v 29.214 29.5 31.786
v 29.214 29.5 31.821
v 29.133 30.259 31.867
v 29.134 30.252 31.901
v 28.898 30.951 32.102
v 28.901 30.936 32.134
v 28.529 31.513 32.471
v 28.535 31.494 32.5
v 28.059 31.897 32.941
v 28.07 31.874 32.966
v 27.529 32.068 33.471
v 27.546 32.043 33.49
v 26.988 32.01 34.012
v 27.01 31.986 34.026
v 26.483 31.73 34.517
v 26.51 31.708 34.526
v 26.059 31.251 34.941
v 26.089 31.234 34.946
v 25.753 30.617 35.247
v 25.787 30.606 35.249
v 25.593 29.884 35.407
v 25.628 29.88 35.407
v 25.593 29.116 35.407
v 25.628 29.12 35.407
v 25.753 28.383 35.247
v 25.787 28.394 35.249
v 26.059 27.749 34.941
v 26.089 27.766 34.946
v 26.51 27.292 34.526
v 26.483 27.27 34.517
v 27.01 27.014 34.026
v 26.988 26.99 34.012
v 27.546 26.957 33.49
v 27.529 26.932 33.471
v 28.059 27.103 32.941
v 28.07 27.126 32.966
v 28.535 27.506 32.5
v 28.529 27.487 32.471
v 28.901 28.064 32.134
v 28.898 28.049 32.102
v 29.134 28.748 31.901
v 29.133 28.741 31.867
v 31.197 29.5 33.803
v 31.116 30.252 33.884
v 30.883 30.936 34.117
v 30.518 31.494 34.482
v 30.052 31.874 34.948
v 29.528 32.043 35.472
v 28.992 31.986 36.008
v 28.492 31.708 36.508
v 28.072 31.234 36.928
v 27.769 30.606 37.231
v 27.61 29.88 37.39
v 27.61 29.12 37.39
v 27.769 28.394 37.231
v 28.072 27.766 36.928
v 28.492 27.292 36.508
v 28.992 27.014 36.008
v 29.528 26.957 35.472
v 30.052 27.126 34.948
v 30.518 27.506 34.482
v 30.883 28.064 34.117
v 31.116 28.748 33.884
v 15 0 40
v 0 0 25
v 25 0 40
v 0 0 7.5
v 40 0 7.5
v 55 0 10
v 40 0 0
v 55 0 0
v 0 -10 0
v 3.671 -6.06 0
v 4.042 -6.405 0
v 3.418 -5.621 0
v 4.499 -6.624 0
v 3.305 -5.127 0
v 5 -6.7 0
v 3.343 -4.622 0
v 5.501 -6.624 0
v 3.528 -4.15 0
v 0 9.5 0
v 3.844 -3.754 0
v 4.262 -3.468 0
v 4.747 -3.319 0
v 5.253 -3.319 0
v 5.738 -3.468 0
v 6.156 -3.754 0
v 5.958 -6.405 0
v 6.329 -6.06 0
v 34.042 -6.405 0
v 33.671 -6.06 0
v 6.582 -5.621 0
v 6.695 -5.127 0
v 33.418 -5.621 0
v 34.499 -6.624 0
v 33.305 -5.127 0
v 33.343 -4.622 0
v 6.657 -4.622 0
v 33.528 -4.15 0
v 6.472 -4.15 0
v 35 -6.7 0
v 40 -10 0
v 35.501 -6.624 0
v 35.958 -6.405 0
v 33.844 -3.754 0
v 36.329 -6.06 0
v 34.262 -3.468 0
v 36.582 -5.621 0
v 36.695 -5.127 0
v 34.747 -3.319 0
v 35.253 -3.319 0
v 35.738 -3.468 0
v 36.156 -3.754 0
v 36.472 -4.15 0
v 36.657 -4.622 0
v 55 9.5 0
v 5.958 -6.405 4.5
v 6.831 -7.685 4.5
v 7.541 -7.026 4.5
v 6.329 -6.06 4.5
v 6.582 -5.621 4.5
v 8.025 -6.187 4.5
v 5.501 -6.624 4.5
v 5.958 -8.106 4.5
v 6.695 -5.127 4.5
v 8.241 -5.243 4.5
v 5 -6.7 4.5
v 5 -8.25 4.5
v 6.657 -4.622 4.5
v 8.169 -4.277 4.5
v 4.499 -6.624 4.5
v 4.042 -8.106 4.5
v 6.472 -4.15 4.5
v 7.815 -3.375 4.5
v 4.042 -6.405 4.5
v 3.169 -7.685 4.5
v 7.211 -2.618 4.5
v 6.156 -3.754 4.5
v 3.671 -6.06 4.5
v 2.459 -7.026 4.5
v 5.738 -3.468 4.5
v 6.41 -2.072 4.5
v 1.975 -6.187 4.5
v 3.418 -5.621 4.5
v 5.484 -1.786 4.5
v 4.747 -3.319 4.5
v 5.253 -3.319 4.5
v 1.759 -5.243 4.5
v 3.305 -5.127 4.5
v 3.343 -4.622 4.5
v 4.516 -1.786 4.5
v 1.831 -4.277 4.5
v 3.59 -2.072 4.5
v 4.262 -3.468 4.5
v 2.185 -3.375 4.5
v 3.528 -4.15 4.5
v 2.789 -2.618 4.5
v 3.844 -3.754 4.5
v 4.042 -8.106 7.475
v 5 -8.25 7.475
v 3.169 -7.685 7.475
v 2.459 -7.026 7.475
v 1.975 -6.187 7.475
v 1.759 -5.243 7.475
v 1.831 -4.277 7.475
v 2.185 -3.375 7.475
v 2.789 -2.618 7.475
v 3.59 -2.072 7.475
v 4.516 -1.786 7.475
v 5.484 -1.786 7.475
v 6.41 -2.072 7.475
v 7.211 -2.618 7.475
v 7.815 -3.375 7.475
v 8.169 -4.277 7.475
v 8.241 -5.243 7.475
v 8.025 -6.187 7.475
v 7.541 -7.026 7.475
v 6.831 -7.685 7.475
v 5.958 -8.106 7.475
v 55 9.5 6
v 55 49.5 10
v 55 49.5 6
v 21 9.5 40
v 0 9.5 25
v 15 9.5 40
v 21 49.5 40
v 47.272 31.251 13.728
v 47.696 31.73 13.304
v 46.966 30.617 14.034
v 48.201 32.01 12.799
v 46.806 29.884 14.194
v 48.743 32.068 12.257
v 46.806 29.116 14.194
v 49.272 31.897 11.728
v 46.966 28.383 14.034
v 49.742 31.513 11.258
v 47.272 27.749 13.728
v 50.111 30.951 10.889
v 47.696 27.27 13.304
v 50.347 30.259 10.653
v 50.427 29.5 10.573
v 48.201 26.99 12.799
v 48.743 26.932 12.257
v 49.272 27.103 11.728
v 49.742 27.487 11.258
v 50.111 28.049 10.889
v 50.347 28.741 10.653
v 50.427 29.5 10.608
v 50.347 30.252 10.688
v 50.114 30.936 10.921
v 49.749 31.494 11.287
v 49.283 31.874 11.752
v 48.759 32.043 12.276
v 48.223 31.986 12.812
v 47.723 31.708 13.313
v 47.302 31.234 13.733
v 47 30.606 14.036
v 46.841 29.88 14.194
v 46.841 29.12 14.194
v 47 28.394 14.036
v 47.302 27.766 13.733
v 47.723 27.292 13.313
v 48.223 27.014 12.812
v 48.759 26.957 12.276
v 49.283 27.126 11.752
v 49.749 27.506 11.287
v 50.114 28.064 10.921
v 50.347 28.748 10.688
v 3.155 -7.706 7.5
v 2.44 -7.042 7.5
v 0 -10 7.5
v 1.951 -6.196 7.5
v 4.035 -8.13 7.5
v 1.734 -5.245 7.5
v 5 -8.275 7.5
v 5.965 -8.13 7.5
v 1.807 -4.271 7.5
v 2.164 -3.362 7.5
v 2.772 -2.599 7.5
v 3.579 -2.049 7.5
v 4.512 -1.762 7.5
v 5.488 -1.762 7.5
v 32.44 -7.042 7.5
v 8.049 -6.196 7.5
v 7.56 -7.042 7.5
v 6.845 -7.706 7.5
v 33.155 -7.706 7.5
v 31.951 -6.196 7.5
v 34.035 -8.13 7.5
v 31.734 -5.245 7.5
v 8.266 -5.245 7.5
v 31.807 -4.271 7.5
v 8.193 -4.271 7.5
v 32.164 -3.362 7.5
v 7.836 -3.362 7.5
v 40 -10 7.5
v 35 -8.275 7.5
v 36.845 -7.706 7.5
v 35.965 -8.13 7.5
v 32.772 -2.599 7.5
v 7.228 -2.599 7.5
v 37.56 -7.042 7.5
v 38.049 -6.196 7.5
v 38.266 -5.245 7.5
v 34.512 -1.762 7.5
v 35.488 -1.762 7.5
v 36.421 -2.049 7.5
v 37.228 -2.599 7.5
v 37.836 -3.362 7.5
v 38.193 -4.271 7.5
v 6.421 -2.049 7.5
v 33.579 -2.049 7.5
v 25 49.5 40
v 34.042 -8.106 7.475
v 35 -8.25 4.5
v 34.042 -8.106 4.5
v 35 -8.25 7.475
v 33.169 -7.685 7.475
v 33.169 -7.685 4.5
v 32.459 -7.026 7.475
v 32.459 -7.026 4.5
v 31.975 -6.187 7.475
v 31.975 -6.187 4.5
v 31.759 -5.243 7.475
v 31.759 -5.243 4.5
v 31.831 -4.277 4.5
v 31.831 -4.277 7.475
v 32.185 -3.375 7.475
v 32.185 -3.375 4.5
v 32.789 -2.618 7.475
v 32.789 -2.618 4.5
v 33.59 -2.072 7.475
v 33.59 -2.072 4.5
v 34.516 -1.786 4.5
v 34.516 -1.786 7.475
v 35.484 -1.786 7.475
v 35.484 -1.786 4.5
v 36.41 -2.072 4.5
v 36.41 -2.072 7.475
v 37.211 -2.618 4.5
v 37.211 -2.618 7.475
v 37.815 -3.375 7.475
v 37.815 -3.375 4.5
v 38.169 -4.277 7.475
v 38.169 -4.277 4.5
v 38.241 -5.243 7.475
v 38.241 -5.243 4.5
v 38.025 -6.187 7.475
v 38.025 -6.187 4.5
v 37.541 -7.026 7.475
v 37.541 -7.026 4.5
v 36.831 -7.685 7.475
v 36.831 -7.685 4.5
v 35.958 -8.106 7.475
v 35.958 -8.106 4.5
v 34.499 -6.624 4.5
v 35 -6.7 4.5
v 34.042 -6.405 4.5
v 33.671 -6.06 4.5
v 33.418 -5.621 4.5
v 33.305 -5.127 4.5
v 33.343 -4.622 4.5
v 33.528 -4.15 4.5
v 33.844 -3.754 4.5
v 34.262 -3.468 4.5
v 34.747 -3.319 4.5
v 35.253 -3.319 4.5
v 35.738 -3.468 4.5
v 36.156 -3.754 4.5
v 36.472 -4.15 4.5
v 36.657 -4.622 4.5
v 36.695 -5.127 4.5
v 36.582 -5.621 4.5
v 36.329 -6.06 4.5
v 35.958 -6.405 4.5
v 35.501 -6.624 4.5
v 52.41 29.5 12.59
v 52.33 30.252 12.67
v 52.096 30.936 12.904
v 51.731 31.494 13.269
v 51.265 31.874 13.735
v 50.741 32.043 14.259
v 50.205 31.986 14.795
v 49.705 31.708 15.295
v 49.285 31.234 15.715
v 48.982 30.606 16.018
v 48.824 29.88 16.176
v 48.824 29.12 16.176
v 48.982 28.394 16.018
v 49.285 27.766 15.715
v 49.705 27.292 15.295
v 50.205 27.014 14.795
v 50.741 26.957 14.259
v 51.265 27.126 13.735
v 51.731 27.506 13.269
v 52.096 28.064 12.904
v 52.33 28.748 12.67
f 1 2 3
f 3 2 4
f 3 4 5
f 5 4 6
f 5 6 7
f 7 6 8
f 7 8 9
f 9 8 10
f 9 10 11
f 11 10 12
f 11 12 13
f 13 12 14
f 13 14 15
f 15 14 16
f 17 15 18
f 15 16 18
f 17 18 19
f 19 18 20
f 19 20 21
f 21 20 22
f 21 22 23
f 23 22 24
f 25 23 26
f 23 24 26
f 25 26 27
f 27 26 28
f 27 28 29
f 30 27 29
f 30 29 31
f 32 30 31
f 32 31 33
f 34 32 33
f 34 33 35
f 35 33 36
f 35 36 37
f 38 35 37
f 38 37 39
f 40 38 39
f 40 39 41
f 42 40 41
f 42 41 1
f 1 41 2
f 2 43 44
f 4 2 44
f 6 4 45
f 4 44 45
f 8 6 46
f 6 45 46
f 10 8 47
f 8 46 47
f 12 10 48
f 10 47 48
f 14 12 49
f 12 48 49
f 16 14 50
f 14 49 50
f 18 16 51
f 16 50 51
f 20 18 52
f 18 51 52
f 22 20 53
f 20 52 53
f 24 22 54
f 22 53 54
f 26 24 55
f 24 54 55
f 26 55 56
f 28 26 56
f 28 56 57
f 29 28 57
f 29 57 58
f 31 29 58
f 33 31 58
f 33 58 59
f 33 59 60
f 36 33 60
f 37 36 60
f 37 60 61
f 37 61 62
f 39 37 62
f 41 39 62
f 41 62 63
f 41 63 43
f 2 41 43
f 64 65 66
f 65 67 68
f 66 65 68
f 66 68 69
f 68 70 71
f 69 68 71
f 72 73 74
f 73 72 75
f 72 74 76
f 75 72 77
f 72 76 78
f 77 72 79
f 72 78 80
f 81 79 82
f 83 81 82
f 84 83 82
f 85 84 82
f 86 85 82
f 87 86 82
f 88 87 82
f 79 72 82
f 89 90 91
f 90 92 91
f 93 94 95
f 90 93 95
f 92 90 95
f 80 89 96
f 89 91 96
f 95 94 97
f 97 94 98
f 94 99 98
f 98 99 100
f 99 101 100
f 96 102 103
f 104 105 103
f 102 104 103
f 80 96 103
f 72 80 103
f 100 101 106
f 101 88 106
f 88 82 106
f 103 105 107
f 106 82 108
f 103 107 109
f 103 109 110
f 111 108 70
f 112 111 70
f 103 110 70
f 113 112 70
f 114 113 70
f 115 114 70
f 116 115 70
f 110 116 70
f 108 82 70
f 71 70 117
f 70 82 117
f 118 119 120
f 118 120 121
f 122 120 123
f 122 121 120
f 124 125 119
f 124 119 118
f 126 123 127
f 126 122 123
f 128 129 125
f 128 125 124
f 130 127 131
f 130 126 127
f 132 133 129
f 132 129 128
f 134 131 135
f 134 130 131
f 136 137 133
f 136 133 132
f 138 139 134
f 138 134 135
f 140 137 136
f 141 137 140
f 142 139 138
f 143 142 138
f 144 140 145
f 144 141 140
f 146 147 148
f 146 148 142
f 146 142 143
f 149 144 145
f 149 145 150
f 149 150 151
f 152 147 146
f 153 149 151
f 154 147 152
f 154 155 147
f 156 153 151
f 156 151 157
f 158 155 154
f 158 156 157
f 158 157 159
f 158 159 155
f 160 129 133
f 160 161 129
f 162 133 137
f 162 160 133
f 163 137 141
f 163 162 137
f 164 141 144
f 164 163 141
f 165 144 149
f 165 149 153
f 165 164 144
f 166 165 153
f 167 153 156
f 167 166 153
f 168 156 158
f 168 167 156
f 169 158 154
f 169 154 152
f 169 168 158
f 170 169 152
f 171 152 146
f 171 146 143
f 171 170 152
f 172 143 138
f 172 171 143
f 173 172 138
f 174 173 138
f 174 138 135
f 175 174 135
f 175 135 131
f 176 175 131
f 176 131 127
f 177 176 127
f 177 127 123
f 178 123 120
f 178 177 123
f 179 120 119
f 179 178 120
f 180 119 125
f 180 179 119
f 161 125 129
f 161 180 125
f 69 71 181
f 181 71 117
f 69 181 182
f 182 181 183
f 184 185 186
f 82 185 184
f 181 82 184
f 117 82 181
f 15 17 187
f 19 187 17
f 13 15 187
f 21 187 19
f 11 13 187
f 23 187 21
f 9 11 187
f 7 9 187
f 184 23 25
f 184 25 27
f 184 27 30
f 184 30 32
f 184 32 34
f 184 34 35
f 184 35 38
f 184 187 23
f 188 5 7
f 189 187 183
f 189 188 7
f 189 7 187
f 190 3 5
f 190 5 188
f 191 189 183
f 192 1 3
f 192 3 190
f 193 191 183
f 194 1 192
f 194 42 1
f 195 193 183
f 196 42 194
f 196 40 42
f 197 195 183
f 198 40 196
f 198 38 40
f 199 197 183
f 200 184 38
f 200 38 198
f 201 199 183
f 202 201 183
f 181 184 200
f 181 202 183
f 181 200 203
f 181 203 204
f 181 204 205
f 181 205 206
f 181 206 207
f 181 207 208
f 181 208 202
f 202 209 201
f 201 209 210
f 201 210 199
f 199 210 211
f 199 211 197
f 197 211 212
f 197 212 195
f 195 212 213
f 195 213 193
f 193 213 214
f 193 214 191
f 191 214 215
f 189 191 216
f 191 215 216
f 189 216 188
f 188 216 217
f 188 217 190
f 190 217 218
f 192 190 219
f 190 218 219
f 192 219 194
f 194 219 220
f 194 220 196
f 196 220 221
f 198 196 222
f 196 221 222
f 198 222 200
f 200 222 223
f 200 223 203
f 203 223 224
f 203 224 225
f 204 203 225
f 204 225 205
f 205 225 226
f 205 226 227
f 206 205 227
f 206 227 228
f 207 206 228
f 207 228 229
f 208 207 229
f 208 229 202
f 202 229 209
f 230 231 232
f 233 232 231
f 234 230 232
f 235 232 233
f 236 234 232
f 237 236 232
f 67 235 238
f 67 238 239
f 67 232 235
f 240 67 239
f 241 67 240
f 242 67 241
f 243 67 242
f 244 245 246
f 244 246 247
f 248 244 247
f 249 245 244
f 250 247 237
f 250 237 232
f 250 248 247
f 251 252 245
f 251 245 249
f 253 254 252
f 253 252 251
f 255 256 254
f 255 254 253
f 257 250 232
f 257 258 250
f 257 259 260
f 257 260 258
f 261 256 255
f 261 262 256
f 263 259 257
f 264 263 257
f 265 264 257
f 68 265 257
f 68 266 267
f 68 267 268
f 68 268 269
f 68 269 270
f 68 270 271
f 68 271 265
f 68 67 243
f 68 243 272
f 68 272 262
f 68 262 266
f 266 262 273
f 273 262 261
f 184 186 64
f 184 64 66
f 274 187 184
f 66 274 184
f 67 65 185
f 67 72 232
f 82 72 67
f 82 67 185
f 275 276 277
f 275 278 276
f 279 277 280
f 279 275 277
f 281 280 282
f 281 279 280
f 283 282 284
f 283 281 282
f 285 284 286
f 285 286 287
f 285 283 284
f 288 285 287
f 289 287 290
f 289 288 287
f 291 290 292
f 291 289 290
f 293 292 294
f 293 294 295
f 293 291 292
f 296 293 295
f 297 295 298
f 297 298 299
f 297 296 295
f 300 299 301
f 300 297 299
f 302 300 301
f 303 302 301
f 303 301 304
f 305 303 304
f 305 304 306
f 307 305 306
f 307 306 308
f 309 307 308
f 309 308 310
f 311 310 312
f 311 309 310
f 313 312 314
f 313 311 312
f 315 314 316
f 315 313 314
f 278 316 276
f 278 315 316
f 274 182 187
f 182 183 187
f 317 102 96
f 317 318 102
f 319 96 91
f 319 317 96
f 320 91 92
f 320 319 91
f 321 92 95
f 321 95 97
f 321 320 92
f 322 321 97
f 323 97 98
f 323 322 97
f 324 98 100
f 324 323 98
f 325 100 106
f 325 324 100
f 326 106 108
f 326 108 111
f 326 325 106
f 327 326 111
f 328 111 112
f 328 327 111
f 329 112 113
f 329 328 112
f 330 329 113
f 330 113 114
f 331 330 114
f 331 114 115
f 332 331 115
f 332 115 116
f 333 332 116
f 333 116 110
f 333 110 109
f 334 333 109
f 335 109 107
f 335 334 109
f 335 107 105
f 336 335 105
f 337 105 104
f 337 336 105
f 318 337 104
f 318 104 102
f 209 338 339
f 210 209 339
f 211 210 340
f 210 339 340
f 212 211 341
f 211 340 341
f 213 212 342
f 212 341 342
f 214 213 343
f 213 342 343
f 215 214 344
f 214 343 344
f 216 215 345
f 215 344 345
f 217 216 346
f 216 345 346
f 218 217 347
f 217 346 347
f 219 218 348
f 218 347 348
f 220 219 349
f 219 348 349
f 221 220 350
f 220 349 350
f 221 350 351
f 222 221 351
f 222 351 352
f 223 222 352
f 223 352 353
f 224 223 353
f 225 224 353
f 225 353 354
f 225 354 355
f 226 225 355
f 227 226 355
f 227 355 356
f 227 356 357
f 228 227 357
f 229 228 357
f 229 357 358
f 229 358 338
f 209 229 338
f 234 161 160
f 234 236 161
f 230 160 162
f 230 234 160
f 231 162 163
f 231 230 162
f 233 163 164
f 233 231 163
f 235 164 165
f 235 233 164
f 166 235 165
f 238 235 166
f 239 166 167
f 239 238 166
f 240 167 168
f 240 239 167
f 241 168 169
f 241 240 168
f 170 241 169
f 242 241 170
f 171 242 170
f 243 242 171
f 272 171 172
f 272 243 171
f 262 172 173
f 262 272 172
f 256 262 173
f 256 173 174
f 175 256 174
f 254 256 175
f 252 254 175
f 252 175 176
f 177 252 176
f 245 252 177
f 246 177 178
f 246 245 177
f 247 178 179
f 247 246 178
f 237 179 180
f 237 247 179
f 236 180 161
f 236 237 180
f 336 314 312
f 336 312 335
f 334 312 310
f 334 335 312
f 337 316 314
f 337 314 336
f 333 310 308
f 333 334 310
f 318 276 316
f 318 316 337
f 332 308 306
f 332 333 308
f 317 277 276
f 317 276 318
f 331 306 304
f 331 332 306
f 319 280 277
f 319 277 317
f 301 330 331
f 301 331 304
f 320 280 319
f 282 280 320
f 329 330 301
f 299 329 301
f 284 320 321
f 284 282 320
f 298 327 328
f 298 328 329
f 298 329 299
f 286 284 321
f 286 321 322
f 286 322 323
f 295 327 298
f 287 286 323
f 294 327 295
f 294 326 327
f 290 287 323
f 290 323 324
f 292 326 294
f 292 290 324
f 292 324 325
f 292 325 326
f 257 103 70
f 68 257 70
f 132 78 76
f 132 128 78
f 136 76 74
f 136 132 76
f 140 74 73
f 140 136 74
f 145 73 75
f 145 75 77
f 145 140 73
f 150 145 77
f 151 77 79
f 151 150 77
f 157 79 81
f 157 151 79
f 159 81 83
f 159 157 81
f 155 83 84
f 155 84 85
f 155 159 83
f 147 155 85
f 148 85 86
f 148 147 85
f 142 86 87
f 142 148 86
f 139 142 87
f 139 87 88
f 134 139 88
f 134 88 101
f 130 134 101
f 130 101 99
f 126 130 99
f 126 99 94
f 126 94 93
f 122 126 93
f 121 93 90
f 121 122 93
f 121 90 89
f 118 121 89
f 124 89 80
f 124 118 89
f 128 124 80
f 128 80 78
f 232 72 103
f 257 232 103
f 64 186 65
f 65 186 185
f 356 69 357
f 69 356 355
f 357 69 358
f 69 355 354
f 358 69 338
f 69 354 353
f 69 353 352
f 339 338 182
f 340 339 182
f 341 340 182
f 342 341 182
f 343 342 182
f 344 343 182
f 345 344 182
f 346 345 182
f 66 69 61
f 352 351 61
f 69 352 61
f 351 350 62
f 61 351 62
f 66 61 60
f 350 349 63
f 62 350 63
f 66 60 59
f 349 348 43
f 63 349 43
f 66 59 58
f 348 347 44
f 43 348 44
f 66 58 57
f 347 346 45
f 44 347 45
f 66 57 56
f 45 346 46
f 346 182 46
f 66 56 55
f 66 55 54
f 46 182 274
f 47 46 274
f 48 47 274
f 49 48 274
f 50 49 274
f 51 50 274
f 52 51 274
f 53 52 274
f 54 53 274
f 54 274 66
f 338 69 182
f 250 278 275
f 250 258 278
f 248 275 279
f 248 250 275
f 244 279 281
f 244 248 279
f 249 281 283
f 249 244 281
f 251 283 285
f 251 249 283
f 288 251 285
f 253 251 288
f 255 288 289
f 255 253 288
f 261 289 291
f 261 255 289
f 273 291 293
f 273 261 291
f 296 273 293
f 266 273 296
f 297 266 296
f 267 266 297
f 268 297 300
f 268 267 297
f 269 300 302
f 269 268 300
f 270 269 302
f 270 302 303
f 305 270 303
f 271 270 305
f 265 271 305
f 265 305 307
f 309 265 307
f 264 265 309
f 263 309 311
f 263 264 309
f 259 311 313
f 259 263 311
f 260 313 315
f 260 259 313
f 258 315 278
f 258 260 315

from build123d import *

# Parameters (mm, degrees)
SKETCH1_W                            = 40
SKETCH1_H                            = 10
BOSS_EXTRUDE1_DEPTH                  = 7.5
CBORE_FOR_M3_SHCS1_AT_2_COUNT        = 2
CBORE_FOR_M3_SHCS1_AT_2_PITCH        = 30
SKETCH4_W                            = 55
SKETCH4_H                            = 9.5
BOSS_EXTRUDE2_DEPTH                  = 40
BOSS_EXTRUDE3_DEPTH                  = 40
CUT_EXTRUDE1_DEPTH                   = 20.5
F_5_1_5_1_DIAMETER_HOLE1_D           = 5.1
F_5_1_5_1_DIAMETER_HOLE1_DEPTH       = 2.828427125
F_5_1_5_1_DIAMETER_HOLE1_CSINK_D     = 5.15
F_5_1_5_1_DIAMETER_HOLE1_CSINK_ANGLE = 90
CUT_EXTRUDE2_DEPTH                   = 20.5


with BuildPart() as part:
    # Sketch1 → Boss-Extrude1 (new body)
    with BuildSketch(Plane.XY):
        with Locations((20, -5)):
            Rectangle(SKETCH1_W, SKETCH1_H)
    extrude(amount=BOSS_EXTRUDE1_DEPTH)

    # Sketch3 → CBORE for M3 SHCS1 (revolve, cut)
    with BuildSketch(Plane(origin=(35, -5, 7.5), x_dir=(0, -1, 0), z_dir=(1, 0, 0))):
        Polygon((0, 0), (0, 7.5), (1.7, 7.5), (1.7, 3), (3.25, 3), (3.25, 0.025), (3.275, 0), align=None)
    cbore_for_m3_shcs1 = revolve(axis=Axis((35, -5, 13.85), (0, 0, -1)), mode=Mode.SUBTRACT)

    # CBORE for M3 SHCS1 at 2: CBORE for M3 SHCS1 ×2
    with Locations(*[(-i * CBORE_FOR_M3_SHCS1_AT_2_PITCH, 0, 0) for i in range(1, CBORE_FOR_M3_SHCS1_AT_2_COUNT)]):
        add(cbore_for_m3_shcs1, mode=Mode.SUBTRACT)

    # Sketch4 → Boss-Extrude2 (add)
    with BuildSketch(Plane.XY):
        with Locations((27.5, 4.75)):
            Rectangle(SKETCH4_W, SKETCH4_H)
    extrude(amount=BOSS_EXTRUDE2_DEPTH)

    # Sketch5 → Boss-Extrude3 (add)
    with BuildSketch(Plane(origin=(0, 9.5, 0), x_dir=(1, 0, 0), z_dir=(0, 1, 0))):
        Polygon((55, -10), (25, -40), (21, -40), (55, -6), align=None)
    extrude(amount=BOSS_EXTRUDE3_DEPTH)

    # Sketch7 → Cut-Extrude1 (cut, through all)
    with BuildSketch(Plane(origin=(0, 9.5, 0), x_dir=(1, 0, 0), z_dir=(0, 1, 0))):
        Polygon((55, -10), (25, -40), (55, -40), align=None)
    extrude(amount=-CUT_EXTRUDE1_DEPTH, mode=Mode.SUBTRACT)

    # Ø5.1 (5.1) Diameter Hole1
    with Locations(Plane(origin=(30.5, 0, 30.5), x_dir=(-0.707106781, 0, 0.707106781), z_dir=(-0.707106781, 0, -0.707106781))):
        with Locations((4.393398282, 29.5), (-25.606601718, 29.5)):
            CounterSinkHole(F_5_1_5_1_DIAMETER_HOLE1_D / 2, F_5_1_5_1_DIAMETER_HOLE1_CSINK_D / 2, depth=F_5_1_5_1_DIAMETER_HOLE1_DEPTH, counter_sink_angle=F_5_1_5_1_DIAMETER_HOLE1_CSINK_ANGLE)

    # Sketch11 → Cut-Extrude2 (cut, through all)
    with BuildSketch(Plane(origin=(0, 9.5, 0), x_dir=(1, 0, 0), z_dir=(0, 1, 0))):
        Polygon((0, -25), (0, -40), (15, -40), align=None)
    extrude(amount=-CUT_EXTRUDE2_DEPTH, mode=Mode.SUBTRACT)


solid = part.part
